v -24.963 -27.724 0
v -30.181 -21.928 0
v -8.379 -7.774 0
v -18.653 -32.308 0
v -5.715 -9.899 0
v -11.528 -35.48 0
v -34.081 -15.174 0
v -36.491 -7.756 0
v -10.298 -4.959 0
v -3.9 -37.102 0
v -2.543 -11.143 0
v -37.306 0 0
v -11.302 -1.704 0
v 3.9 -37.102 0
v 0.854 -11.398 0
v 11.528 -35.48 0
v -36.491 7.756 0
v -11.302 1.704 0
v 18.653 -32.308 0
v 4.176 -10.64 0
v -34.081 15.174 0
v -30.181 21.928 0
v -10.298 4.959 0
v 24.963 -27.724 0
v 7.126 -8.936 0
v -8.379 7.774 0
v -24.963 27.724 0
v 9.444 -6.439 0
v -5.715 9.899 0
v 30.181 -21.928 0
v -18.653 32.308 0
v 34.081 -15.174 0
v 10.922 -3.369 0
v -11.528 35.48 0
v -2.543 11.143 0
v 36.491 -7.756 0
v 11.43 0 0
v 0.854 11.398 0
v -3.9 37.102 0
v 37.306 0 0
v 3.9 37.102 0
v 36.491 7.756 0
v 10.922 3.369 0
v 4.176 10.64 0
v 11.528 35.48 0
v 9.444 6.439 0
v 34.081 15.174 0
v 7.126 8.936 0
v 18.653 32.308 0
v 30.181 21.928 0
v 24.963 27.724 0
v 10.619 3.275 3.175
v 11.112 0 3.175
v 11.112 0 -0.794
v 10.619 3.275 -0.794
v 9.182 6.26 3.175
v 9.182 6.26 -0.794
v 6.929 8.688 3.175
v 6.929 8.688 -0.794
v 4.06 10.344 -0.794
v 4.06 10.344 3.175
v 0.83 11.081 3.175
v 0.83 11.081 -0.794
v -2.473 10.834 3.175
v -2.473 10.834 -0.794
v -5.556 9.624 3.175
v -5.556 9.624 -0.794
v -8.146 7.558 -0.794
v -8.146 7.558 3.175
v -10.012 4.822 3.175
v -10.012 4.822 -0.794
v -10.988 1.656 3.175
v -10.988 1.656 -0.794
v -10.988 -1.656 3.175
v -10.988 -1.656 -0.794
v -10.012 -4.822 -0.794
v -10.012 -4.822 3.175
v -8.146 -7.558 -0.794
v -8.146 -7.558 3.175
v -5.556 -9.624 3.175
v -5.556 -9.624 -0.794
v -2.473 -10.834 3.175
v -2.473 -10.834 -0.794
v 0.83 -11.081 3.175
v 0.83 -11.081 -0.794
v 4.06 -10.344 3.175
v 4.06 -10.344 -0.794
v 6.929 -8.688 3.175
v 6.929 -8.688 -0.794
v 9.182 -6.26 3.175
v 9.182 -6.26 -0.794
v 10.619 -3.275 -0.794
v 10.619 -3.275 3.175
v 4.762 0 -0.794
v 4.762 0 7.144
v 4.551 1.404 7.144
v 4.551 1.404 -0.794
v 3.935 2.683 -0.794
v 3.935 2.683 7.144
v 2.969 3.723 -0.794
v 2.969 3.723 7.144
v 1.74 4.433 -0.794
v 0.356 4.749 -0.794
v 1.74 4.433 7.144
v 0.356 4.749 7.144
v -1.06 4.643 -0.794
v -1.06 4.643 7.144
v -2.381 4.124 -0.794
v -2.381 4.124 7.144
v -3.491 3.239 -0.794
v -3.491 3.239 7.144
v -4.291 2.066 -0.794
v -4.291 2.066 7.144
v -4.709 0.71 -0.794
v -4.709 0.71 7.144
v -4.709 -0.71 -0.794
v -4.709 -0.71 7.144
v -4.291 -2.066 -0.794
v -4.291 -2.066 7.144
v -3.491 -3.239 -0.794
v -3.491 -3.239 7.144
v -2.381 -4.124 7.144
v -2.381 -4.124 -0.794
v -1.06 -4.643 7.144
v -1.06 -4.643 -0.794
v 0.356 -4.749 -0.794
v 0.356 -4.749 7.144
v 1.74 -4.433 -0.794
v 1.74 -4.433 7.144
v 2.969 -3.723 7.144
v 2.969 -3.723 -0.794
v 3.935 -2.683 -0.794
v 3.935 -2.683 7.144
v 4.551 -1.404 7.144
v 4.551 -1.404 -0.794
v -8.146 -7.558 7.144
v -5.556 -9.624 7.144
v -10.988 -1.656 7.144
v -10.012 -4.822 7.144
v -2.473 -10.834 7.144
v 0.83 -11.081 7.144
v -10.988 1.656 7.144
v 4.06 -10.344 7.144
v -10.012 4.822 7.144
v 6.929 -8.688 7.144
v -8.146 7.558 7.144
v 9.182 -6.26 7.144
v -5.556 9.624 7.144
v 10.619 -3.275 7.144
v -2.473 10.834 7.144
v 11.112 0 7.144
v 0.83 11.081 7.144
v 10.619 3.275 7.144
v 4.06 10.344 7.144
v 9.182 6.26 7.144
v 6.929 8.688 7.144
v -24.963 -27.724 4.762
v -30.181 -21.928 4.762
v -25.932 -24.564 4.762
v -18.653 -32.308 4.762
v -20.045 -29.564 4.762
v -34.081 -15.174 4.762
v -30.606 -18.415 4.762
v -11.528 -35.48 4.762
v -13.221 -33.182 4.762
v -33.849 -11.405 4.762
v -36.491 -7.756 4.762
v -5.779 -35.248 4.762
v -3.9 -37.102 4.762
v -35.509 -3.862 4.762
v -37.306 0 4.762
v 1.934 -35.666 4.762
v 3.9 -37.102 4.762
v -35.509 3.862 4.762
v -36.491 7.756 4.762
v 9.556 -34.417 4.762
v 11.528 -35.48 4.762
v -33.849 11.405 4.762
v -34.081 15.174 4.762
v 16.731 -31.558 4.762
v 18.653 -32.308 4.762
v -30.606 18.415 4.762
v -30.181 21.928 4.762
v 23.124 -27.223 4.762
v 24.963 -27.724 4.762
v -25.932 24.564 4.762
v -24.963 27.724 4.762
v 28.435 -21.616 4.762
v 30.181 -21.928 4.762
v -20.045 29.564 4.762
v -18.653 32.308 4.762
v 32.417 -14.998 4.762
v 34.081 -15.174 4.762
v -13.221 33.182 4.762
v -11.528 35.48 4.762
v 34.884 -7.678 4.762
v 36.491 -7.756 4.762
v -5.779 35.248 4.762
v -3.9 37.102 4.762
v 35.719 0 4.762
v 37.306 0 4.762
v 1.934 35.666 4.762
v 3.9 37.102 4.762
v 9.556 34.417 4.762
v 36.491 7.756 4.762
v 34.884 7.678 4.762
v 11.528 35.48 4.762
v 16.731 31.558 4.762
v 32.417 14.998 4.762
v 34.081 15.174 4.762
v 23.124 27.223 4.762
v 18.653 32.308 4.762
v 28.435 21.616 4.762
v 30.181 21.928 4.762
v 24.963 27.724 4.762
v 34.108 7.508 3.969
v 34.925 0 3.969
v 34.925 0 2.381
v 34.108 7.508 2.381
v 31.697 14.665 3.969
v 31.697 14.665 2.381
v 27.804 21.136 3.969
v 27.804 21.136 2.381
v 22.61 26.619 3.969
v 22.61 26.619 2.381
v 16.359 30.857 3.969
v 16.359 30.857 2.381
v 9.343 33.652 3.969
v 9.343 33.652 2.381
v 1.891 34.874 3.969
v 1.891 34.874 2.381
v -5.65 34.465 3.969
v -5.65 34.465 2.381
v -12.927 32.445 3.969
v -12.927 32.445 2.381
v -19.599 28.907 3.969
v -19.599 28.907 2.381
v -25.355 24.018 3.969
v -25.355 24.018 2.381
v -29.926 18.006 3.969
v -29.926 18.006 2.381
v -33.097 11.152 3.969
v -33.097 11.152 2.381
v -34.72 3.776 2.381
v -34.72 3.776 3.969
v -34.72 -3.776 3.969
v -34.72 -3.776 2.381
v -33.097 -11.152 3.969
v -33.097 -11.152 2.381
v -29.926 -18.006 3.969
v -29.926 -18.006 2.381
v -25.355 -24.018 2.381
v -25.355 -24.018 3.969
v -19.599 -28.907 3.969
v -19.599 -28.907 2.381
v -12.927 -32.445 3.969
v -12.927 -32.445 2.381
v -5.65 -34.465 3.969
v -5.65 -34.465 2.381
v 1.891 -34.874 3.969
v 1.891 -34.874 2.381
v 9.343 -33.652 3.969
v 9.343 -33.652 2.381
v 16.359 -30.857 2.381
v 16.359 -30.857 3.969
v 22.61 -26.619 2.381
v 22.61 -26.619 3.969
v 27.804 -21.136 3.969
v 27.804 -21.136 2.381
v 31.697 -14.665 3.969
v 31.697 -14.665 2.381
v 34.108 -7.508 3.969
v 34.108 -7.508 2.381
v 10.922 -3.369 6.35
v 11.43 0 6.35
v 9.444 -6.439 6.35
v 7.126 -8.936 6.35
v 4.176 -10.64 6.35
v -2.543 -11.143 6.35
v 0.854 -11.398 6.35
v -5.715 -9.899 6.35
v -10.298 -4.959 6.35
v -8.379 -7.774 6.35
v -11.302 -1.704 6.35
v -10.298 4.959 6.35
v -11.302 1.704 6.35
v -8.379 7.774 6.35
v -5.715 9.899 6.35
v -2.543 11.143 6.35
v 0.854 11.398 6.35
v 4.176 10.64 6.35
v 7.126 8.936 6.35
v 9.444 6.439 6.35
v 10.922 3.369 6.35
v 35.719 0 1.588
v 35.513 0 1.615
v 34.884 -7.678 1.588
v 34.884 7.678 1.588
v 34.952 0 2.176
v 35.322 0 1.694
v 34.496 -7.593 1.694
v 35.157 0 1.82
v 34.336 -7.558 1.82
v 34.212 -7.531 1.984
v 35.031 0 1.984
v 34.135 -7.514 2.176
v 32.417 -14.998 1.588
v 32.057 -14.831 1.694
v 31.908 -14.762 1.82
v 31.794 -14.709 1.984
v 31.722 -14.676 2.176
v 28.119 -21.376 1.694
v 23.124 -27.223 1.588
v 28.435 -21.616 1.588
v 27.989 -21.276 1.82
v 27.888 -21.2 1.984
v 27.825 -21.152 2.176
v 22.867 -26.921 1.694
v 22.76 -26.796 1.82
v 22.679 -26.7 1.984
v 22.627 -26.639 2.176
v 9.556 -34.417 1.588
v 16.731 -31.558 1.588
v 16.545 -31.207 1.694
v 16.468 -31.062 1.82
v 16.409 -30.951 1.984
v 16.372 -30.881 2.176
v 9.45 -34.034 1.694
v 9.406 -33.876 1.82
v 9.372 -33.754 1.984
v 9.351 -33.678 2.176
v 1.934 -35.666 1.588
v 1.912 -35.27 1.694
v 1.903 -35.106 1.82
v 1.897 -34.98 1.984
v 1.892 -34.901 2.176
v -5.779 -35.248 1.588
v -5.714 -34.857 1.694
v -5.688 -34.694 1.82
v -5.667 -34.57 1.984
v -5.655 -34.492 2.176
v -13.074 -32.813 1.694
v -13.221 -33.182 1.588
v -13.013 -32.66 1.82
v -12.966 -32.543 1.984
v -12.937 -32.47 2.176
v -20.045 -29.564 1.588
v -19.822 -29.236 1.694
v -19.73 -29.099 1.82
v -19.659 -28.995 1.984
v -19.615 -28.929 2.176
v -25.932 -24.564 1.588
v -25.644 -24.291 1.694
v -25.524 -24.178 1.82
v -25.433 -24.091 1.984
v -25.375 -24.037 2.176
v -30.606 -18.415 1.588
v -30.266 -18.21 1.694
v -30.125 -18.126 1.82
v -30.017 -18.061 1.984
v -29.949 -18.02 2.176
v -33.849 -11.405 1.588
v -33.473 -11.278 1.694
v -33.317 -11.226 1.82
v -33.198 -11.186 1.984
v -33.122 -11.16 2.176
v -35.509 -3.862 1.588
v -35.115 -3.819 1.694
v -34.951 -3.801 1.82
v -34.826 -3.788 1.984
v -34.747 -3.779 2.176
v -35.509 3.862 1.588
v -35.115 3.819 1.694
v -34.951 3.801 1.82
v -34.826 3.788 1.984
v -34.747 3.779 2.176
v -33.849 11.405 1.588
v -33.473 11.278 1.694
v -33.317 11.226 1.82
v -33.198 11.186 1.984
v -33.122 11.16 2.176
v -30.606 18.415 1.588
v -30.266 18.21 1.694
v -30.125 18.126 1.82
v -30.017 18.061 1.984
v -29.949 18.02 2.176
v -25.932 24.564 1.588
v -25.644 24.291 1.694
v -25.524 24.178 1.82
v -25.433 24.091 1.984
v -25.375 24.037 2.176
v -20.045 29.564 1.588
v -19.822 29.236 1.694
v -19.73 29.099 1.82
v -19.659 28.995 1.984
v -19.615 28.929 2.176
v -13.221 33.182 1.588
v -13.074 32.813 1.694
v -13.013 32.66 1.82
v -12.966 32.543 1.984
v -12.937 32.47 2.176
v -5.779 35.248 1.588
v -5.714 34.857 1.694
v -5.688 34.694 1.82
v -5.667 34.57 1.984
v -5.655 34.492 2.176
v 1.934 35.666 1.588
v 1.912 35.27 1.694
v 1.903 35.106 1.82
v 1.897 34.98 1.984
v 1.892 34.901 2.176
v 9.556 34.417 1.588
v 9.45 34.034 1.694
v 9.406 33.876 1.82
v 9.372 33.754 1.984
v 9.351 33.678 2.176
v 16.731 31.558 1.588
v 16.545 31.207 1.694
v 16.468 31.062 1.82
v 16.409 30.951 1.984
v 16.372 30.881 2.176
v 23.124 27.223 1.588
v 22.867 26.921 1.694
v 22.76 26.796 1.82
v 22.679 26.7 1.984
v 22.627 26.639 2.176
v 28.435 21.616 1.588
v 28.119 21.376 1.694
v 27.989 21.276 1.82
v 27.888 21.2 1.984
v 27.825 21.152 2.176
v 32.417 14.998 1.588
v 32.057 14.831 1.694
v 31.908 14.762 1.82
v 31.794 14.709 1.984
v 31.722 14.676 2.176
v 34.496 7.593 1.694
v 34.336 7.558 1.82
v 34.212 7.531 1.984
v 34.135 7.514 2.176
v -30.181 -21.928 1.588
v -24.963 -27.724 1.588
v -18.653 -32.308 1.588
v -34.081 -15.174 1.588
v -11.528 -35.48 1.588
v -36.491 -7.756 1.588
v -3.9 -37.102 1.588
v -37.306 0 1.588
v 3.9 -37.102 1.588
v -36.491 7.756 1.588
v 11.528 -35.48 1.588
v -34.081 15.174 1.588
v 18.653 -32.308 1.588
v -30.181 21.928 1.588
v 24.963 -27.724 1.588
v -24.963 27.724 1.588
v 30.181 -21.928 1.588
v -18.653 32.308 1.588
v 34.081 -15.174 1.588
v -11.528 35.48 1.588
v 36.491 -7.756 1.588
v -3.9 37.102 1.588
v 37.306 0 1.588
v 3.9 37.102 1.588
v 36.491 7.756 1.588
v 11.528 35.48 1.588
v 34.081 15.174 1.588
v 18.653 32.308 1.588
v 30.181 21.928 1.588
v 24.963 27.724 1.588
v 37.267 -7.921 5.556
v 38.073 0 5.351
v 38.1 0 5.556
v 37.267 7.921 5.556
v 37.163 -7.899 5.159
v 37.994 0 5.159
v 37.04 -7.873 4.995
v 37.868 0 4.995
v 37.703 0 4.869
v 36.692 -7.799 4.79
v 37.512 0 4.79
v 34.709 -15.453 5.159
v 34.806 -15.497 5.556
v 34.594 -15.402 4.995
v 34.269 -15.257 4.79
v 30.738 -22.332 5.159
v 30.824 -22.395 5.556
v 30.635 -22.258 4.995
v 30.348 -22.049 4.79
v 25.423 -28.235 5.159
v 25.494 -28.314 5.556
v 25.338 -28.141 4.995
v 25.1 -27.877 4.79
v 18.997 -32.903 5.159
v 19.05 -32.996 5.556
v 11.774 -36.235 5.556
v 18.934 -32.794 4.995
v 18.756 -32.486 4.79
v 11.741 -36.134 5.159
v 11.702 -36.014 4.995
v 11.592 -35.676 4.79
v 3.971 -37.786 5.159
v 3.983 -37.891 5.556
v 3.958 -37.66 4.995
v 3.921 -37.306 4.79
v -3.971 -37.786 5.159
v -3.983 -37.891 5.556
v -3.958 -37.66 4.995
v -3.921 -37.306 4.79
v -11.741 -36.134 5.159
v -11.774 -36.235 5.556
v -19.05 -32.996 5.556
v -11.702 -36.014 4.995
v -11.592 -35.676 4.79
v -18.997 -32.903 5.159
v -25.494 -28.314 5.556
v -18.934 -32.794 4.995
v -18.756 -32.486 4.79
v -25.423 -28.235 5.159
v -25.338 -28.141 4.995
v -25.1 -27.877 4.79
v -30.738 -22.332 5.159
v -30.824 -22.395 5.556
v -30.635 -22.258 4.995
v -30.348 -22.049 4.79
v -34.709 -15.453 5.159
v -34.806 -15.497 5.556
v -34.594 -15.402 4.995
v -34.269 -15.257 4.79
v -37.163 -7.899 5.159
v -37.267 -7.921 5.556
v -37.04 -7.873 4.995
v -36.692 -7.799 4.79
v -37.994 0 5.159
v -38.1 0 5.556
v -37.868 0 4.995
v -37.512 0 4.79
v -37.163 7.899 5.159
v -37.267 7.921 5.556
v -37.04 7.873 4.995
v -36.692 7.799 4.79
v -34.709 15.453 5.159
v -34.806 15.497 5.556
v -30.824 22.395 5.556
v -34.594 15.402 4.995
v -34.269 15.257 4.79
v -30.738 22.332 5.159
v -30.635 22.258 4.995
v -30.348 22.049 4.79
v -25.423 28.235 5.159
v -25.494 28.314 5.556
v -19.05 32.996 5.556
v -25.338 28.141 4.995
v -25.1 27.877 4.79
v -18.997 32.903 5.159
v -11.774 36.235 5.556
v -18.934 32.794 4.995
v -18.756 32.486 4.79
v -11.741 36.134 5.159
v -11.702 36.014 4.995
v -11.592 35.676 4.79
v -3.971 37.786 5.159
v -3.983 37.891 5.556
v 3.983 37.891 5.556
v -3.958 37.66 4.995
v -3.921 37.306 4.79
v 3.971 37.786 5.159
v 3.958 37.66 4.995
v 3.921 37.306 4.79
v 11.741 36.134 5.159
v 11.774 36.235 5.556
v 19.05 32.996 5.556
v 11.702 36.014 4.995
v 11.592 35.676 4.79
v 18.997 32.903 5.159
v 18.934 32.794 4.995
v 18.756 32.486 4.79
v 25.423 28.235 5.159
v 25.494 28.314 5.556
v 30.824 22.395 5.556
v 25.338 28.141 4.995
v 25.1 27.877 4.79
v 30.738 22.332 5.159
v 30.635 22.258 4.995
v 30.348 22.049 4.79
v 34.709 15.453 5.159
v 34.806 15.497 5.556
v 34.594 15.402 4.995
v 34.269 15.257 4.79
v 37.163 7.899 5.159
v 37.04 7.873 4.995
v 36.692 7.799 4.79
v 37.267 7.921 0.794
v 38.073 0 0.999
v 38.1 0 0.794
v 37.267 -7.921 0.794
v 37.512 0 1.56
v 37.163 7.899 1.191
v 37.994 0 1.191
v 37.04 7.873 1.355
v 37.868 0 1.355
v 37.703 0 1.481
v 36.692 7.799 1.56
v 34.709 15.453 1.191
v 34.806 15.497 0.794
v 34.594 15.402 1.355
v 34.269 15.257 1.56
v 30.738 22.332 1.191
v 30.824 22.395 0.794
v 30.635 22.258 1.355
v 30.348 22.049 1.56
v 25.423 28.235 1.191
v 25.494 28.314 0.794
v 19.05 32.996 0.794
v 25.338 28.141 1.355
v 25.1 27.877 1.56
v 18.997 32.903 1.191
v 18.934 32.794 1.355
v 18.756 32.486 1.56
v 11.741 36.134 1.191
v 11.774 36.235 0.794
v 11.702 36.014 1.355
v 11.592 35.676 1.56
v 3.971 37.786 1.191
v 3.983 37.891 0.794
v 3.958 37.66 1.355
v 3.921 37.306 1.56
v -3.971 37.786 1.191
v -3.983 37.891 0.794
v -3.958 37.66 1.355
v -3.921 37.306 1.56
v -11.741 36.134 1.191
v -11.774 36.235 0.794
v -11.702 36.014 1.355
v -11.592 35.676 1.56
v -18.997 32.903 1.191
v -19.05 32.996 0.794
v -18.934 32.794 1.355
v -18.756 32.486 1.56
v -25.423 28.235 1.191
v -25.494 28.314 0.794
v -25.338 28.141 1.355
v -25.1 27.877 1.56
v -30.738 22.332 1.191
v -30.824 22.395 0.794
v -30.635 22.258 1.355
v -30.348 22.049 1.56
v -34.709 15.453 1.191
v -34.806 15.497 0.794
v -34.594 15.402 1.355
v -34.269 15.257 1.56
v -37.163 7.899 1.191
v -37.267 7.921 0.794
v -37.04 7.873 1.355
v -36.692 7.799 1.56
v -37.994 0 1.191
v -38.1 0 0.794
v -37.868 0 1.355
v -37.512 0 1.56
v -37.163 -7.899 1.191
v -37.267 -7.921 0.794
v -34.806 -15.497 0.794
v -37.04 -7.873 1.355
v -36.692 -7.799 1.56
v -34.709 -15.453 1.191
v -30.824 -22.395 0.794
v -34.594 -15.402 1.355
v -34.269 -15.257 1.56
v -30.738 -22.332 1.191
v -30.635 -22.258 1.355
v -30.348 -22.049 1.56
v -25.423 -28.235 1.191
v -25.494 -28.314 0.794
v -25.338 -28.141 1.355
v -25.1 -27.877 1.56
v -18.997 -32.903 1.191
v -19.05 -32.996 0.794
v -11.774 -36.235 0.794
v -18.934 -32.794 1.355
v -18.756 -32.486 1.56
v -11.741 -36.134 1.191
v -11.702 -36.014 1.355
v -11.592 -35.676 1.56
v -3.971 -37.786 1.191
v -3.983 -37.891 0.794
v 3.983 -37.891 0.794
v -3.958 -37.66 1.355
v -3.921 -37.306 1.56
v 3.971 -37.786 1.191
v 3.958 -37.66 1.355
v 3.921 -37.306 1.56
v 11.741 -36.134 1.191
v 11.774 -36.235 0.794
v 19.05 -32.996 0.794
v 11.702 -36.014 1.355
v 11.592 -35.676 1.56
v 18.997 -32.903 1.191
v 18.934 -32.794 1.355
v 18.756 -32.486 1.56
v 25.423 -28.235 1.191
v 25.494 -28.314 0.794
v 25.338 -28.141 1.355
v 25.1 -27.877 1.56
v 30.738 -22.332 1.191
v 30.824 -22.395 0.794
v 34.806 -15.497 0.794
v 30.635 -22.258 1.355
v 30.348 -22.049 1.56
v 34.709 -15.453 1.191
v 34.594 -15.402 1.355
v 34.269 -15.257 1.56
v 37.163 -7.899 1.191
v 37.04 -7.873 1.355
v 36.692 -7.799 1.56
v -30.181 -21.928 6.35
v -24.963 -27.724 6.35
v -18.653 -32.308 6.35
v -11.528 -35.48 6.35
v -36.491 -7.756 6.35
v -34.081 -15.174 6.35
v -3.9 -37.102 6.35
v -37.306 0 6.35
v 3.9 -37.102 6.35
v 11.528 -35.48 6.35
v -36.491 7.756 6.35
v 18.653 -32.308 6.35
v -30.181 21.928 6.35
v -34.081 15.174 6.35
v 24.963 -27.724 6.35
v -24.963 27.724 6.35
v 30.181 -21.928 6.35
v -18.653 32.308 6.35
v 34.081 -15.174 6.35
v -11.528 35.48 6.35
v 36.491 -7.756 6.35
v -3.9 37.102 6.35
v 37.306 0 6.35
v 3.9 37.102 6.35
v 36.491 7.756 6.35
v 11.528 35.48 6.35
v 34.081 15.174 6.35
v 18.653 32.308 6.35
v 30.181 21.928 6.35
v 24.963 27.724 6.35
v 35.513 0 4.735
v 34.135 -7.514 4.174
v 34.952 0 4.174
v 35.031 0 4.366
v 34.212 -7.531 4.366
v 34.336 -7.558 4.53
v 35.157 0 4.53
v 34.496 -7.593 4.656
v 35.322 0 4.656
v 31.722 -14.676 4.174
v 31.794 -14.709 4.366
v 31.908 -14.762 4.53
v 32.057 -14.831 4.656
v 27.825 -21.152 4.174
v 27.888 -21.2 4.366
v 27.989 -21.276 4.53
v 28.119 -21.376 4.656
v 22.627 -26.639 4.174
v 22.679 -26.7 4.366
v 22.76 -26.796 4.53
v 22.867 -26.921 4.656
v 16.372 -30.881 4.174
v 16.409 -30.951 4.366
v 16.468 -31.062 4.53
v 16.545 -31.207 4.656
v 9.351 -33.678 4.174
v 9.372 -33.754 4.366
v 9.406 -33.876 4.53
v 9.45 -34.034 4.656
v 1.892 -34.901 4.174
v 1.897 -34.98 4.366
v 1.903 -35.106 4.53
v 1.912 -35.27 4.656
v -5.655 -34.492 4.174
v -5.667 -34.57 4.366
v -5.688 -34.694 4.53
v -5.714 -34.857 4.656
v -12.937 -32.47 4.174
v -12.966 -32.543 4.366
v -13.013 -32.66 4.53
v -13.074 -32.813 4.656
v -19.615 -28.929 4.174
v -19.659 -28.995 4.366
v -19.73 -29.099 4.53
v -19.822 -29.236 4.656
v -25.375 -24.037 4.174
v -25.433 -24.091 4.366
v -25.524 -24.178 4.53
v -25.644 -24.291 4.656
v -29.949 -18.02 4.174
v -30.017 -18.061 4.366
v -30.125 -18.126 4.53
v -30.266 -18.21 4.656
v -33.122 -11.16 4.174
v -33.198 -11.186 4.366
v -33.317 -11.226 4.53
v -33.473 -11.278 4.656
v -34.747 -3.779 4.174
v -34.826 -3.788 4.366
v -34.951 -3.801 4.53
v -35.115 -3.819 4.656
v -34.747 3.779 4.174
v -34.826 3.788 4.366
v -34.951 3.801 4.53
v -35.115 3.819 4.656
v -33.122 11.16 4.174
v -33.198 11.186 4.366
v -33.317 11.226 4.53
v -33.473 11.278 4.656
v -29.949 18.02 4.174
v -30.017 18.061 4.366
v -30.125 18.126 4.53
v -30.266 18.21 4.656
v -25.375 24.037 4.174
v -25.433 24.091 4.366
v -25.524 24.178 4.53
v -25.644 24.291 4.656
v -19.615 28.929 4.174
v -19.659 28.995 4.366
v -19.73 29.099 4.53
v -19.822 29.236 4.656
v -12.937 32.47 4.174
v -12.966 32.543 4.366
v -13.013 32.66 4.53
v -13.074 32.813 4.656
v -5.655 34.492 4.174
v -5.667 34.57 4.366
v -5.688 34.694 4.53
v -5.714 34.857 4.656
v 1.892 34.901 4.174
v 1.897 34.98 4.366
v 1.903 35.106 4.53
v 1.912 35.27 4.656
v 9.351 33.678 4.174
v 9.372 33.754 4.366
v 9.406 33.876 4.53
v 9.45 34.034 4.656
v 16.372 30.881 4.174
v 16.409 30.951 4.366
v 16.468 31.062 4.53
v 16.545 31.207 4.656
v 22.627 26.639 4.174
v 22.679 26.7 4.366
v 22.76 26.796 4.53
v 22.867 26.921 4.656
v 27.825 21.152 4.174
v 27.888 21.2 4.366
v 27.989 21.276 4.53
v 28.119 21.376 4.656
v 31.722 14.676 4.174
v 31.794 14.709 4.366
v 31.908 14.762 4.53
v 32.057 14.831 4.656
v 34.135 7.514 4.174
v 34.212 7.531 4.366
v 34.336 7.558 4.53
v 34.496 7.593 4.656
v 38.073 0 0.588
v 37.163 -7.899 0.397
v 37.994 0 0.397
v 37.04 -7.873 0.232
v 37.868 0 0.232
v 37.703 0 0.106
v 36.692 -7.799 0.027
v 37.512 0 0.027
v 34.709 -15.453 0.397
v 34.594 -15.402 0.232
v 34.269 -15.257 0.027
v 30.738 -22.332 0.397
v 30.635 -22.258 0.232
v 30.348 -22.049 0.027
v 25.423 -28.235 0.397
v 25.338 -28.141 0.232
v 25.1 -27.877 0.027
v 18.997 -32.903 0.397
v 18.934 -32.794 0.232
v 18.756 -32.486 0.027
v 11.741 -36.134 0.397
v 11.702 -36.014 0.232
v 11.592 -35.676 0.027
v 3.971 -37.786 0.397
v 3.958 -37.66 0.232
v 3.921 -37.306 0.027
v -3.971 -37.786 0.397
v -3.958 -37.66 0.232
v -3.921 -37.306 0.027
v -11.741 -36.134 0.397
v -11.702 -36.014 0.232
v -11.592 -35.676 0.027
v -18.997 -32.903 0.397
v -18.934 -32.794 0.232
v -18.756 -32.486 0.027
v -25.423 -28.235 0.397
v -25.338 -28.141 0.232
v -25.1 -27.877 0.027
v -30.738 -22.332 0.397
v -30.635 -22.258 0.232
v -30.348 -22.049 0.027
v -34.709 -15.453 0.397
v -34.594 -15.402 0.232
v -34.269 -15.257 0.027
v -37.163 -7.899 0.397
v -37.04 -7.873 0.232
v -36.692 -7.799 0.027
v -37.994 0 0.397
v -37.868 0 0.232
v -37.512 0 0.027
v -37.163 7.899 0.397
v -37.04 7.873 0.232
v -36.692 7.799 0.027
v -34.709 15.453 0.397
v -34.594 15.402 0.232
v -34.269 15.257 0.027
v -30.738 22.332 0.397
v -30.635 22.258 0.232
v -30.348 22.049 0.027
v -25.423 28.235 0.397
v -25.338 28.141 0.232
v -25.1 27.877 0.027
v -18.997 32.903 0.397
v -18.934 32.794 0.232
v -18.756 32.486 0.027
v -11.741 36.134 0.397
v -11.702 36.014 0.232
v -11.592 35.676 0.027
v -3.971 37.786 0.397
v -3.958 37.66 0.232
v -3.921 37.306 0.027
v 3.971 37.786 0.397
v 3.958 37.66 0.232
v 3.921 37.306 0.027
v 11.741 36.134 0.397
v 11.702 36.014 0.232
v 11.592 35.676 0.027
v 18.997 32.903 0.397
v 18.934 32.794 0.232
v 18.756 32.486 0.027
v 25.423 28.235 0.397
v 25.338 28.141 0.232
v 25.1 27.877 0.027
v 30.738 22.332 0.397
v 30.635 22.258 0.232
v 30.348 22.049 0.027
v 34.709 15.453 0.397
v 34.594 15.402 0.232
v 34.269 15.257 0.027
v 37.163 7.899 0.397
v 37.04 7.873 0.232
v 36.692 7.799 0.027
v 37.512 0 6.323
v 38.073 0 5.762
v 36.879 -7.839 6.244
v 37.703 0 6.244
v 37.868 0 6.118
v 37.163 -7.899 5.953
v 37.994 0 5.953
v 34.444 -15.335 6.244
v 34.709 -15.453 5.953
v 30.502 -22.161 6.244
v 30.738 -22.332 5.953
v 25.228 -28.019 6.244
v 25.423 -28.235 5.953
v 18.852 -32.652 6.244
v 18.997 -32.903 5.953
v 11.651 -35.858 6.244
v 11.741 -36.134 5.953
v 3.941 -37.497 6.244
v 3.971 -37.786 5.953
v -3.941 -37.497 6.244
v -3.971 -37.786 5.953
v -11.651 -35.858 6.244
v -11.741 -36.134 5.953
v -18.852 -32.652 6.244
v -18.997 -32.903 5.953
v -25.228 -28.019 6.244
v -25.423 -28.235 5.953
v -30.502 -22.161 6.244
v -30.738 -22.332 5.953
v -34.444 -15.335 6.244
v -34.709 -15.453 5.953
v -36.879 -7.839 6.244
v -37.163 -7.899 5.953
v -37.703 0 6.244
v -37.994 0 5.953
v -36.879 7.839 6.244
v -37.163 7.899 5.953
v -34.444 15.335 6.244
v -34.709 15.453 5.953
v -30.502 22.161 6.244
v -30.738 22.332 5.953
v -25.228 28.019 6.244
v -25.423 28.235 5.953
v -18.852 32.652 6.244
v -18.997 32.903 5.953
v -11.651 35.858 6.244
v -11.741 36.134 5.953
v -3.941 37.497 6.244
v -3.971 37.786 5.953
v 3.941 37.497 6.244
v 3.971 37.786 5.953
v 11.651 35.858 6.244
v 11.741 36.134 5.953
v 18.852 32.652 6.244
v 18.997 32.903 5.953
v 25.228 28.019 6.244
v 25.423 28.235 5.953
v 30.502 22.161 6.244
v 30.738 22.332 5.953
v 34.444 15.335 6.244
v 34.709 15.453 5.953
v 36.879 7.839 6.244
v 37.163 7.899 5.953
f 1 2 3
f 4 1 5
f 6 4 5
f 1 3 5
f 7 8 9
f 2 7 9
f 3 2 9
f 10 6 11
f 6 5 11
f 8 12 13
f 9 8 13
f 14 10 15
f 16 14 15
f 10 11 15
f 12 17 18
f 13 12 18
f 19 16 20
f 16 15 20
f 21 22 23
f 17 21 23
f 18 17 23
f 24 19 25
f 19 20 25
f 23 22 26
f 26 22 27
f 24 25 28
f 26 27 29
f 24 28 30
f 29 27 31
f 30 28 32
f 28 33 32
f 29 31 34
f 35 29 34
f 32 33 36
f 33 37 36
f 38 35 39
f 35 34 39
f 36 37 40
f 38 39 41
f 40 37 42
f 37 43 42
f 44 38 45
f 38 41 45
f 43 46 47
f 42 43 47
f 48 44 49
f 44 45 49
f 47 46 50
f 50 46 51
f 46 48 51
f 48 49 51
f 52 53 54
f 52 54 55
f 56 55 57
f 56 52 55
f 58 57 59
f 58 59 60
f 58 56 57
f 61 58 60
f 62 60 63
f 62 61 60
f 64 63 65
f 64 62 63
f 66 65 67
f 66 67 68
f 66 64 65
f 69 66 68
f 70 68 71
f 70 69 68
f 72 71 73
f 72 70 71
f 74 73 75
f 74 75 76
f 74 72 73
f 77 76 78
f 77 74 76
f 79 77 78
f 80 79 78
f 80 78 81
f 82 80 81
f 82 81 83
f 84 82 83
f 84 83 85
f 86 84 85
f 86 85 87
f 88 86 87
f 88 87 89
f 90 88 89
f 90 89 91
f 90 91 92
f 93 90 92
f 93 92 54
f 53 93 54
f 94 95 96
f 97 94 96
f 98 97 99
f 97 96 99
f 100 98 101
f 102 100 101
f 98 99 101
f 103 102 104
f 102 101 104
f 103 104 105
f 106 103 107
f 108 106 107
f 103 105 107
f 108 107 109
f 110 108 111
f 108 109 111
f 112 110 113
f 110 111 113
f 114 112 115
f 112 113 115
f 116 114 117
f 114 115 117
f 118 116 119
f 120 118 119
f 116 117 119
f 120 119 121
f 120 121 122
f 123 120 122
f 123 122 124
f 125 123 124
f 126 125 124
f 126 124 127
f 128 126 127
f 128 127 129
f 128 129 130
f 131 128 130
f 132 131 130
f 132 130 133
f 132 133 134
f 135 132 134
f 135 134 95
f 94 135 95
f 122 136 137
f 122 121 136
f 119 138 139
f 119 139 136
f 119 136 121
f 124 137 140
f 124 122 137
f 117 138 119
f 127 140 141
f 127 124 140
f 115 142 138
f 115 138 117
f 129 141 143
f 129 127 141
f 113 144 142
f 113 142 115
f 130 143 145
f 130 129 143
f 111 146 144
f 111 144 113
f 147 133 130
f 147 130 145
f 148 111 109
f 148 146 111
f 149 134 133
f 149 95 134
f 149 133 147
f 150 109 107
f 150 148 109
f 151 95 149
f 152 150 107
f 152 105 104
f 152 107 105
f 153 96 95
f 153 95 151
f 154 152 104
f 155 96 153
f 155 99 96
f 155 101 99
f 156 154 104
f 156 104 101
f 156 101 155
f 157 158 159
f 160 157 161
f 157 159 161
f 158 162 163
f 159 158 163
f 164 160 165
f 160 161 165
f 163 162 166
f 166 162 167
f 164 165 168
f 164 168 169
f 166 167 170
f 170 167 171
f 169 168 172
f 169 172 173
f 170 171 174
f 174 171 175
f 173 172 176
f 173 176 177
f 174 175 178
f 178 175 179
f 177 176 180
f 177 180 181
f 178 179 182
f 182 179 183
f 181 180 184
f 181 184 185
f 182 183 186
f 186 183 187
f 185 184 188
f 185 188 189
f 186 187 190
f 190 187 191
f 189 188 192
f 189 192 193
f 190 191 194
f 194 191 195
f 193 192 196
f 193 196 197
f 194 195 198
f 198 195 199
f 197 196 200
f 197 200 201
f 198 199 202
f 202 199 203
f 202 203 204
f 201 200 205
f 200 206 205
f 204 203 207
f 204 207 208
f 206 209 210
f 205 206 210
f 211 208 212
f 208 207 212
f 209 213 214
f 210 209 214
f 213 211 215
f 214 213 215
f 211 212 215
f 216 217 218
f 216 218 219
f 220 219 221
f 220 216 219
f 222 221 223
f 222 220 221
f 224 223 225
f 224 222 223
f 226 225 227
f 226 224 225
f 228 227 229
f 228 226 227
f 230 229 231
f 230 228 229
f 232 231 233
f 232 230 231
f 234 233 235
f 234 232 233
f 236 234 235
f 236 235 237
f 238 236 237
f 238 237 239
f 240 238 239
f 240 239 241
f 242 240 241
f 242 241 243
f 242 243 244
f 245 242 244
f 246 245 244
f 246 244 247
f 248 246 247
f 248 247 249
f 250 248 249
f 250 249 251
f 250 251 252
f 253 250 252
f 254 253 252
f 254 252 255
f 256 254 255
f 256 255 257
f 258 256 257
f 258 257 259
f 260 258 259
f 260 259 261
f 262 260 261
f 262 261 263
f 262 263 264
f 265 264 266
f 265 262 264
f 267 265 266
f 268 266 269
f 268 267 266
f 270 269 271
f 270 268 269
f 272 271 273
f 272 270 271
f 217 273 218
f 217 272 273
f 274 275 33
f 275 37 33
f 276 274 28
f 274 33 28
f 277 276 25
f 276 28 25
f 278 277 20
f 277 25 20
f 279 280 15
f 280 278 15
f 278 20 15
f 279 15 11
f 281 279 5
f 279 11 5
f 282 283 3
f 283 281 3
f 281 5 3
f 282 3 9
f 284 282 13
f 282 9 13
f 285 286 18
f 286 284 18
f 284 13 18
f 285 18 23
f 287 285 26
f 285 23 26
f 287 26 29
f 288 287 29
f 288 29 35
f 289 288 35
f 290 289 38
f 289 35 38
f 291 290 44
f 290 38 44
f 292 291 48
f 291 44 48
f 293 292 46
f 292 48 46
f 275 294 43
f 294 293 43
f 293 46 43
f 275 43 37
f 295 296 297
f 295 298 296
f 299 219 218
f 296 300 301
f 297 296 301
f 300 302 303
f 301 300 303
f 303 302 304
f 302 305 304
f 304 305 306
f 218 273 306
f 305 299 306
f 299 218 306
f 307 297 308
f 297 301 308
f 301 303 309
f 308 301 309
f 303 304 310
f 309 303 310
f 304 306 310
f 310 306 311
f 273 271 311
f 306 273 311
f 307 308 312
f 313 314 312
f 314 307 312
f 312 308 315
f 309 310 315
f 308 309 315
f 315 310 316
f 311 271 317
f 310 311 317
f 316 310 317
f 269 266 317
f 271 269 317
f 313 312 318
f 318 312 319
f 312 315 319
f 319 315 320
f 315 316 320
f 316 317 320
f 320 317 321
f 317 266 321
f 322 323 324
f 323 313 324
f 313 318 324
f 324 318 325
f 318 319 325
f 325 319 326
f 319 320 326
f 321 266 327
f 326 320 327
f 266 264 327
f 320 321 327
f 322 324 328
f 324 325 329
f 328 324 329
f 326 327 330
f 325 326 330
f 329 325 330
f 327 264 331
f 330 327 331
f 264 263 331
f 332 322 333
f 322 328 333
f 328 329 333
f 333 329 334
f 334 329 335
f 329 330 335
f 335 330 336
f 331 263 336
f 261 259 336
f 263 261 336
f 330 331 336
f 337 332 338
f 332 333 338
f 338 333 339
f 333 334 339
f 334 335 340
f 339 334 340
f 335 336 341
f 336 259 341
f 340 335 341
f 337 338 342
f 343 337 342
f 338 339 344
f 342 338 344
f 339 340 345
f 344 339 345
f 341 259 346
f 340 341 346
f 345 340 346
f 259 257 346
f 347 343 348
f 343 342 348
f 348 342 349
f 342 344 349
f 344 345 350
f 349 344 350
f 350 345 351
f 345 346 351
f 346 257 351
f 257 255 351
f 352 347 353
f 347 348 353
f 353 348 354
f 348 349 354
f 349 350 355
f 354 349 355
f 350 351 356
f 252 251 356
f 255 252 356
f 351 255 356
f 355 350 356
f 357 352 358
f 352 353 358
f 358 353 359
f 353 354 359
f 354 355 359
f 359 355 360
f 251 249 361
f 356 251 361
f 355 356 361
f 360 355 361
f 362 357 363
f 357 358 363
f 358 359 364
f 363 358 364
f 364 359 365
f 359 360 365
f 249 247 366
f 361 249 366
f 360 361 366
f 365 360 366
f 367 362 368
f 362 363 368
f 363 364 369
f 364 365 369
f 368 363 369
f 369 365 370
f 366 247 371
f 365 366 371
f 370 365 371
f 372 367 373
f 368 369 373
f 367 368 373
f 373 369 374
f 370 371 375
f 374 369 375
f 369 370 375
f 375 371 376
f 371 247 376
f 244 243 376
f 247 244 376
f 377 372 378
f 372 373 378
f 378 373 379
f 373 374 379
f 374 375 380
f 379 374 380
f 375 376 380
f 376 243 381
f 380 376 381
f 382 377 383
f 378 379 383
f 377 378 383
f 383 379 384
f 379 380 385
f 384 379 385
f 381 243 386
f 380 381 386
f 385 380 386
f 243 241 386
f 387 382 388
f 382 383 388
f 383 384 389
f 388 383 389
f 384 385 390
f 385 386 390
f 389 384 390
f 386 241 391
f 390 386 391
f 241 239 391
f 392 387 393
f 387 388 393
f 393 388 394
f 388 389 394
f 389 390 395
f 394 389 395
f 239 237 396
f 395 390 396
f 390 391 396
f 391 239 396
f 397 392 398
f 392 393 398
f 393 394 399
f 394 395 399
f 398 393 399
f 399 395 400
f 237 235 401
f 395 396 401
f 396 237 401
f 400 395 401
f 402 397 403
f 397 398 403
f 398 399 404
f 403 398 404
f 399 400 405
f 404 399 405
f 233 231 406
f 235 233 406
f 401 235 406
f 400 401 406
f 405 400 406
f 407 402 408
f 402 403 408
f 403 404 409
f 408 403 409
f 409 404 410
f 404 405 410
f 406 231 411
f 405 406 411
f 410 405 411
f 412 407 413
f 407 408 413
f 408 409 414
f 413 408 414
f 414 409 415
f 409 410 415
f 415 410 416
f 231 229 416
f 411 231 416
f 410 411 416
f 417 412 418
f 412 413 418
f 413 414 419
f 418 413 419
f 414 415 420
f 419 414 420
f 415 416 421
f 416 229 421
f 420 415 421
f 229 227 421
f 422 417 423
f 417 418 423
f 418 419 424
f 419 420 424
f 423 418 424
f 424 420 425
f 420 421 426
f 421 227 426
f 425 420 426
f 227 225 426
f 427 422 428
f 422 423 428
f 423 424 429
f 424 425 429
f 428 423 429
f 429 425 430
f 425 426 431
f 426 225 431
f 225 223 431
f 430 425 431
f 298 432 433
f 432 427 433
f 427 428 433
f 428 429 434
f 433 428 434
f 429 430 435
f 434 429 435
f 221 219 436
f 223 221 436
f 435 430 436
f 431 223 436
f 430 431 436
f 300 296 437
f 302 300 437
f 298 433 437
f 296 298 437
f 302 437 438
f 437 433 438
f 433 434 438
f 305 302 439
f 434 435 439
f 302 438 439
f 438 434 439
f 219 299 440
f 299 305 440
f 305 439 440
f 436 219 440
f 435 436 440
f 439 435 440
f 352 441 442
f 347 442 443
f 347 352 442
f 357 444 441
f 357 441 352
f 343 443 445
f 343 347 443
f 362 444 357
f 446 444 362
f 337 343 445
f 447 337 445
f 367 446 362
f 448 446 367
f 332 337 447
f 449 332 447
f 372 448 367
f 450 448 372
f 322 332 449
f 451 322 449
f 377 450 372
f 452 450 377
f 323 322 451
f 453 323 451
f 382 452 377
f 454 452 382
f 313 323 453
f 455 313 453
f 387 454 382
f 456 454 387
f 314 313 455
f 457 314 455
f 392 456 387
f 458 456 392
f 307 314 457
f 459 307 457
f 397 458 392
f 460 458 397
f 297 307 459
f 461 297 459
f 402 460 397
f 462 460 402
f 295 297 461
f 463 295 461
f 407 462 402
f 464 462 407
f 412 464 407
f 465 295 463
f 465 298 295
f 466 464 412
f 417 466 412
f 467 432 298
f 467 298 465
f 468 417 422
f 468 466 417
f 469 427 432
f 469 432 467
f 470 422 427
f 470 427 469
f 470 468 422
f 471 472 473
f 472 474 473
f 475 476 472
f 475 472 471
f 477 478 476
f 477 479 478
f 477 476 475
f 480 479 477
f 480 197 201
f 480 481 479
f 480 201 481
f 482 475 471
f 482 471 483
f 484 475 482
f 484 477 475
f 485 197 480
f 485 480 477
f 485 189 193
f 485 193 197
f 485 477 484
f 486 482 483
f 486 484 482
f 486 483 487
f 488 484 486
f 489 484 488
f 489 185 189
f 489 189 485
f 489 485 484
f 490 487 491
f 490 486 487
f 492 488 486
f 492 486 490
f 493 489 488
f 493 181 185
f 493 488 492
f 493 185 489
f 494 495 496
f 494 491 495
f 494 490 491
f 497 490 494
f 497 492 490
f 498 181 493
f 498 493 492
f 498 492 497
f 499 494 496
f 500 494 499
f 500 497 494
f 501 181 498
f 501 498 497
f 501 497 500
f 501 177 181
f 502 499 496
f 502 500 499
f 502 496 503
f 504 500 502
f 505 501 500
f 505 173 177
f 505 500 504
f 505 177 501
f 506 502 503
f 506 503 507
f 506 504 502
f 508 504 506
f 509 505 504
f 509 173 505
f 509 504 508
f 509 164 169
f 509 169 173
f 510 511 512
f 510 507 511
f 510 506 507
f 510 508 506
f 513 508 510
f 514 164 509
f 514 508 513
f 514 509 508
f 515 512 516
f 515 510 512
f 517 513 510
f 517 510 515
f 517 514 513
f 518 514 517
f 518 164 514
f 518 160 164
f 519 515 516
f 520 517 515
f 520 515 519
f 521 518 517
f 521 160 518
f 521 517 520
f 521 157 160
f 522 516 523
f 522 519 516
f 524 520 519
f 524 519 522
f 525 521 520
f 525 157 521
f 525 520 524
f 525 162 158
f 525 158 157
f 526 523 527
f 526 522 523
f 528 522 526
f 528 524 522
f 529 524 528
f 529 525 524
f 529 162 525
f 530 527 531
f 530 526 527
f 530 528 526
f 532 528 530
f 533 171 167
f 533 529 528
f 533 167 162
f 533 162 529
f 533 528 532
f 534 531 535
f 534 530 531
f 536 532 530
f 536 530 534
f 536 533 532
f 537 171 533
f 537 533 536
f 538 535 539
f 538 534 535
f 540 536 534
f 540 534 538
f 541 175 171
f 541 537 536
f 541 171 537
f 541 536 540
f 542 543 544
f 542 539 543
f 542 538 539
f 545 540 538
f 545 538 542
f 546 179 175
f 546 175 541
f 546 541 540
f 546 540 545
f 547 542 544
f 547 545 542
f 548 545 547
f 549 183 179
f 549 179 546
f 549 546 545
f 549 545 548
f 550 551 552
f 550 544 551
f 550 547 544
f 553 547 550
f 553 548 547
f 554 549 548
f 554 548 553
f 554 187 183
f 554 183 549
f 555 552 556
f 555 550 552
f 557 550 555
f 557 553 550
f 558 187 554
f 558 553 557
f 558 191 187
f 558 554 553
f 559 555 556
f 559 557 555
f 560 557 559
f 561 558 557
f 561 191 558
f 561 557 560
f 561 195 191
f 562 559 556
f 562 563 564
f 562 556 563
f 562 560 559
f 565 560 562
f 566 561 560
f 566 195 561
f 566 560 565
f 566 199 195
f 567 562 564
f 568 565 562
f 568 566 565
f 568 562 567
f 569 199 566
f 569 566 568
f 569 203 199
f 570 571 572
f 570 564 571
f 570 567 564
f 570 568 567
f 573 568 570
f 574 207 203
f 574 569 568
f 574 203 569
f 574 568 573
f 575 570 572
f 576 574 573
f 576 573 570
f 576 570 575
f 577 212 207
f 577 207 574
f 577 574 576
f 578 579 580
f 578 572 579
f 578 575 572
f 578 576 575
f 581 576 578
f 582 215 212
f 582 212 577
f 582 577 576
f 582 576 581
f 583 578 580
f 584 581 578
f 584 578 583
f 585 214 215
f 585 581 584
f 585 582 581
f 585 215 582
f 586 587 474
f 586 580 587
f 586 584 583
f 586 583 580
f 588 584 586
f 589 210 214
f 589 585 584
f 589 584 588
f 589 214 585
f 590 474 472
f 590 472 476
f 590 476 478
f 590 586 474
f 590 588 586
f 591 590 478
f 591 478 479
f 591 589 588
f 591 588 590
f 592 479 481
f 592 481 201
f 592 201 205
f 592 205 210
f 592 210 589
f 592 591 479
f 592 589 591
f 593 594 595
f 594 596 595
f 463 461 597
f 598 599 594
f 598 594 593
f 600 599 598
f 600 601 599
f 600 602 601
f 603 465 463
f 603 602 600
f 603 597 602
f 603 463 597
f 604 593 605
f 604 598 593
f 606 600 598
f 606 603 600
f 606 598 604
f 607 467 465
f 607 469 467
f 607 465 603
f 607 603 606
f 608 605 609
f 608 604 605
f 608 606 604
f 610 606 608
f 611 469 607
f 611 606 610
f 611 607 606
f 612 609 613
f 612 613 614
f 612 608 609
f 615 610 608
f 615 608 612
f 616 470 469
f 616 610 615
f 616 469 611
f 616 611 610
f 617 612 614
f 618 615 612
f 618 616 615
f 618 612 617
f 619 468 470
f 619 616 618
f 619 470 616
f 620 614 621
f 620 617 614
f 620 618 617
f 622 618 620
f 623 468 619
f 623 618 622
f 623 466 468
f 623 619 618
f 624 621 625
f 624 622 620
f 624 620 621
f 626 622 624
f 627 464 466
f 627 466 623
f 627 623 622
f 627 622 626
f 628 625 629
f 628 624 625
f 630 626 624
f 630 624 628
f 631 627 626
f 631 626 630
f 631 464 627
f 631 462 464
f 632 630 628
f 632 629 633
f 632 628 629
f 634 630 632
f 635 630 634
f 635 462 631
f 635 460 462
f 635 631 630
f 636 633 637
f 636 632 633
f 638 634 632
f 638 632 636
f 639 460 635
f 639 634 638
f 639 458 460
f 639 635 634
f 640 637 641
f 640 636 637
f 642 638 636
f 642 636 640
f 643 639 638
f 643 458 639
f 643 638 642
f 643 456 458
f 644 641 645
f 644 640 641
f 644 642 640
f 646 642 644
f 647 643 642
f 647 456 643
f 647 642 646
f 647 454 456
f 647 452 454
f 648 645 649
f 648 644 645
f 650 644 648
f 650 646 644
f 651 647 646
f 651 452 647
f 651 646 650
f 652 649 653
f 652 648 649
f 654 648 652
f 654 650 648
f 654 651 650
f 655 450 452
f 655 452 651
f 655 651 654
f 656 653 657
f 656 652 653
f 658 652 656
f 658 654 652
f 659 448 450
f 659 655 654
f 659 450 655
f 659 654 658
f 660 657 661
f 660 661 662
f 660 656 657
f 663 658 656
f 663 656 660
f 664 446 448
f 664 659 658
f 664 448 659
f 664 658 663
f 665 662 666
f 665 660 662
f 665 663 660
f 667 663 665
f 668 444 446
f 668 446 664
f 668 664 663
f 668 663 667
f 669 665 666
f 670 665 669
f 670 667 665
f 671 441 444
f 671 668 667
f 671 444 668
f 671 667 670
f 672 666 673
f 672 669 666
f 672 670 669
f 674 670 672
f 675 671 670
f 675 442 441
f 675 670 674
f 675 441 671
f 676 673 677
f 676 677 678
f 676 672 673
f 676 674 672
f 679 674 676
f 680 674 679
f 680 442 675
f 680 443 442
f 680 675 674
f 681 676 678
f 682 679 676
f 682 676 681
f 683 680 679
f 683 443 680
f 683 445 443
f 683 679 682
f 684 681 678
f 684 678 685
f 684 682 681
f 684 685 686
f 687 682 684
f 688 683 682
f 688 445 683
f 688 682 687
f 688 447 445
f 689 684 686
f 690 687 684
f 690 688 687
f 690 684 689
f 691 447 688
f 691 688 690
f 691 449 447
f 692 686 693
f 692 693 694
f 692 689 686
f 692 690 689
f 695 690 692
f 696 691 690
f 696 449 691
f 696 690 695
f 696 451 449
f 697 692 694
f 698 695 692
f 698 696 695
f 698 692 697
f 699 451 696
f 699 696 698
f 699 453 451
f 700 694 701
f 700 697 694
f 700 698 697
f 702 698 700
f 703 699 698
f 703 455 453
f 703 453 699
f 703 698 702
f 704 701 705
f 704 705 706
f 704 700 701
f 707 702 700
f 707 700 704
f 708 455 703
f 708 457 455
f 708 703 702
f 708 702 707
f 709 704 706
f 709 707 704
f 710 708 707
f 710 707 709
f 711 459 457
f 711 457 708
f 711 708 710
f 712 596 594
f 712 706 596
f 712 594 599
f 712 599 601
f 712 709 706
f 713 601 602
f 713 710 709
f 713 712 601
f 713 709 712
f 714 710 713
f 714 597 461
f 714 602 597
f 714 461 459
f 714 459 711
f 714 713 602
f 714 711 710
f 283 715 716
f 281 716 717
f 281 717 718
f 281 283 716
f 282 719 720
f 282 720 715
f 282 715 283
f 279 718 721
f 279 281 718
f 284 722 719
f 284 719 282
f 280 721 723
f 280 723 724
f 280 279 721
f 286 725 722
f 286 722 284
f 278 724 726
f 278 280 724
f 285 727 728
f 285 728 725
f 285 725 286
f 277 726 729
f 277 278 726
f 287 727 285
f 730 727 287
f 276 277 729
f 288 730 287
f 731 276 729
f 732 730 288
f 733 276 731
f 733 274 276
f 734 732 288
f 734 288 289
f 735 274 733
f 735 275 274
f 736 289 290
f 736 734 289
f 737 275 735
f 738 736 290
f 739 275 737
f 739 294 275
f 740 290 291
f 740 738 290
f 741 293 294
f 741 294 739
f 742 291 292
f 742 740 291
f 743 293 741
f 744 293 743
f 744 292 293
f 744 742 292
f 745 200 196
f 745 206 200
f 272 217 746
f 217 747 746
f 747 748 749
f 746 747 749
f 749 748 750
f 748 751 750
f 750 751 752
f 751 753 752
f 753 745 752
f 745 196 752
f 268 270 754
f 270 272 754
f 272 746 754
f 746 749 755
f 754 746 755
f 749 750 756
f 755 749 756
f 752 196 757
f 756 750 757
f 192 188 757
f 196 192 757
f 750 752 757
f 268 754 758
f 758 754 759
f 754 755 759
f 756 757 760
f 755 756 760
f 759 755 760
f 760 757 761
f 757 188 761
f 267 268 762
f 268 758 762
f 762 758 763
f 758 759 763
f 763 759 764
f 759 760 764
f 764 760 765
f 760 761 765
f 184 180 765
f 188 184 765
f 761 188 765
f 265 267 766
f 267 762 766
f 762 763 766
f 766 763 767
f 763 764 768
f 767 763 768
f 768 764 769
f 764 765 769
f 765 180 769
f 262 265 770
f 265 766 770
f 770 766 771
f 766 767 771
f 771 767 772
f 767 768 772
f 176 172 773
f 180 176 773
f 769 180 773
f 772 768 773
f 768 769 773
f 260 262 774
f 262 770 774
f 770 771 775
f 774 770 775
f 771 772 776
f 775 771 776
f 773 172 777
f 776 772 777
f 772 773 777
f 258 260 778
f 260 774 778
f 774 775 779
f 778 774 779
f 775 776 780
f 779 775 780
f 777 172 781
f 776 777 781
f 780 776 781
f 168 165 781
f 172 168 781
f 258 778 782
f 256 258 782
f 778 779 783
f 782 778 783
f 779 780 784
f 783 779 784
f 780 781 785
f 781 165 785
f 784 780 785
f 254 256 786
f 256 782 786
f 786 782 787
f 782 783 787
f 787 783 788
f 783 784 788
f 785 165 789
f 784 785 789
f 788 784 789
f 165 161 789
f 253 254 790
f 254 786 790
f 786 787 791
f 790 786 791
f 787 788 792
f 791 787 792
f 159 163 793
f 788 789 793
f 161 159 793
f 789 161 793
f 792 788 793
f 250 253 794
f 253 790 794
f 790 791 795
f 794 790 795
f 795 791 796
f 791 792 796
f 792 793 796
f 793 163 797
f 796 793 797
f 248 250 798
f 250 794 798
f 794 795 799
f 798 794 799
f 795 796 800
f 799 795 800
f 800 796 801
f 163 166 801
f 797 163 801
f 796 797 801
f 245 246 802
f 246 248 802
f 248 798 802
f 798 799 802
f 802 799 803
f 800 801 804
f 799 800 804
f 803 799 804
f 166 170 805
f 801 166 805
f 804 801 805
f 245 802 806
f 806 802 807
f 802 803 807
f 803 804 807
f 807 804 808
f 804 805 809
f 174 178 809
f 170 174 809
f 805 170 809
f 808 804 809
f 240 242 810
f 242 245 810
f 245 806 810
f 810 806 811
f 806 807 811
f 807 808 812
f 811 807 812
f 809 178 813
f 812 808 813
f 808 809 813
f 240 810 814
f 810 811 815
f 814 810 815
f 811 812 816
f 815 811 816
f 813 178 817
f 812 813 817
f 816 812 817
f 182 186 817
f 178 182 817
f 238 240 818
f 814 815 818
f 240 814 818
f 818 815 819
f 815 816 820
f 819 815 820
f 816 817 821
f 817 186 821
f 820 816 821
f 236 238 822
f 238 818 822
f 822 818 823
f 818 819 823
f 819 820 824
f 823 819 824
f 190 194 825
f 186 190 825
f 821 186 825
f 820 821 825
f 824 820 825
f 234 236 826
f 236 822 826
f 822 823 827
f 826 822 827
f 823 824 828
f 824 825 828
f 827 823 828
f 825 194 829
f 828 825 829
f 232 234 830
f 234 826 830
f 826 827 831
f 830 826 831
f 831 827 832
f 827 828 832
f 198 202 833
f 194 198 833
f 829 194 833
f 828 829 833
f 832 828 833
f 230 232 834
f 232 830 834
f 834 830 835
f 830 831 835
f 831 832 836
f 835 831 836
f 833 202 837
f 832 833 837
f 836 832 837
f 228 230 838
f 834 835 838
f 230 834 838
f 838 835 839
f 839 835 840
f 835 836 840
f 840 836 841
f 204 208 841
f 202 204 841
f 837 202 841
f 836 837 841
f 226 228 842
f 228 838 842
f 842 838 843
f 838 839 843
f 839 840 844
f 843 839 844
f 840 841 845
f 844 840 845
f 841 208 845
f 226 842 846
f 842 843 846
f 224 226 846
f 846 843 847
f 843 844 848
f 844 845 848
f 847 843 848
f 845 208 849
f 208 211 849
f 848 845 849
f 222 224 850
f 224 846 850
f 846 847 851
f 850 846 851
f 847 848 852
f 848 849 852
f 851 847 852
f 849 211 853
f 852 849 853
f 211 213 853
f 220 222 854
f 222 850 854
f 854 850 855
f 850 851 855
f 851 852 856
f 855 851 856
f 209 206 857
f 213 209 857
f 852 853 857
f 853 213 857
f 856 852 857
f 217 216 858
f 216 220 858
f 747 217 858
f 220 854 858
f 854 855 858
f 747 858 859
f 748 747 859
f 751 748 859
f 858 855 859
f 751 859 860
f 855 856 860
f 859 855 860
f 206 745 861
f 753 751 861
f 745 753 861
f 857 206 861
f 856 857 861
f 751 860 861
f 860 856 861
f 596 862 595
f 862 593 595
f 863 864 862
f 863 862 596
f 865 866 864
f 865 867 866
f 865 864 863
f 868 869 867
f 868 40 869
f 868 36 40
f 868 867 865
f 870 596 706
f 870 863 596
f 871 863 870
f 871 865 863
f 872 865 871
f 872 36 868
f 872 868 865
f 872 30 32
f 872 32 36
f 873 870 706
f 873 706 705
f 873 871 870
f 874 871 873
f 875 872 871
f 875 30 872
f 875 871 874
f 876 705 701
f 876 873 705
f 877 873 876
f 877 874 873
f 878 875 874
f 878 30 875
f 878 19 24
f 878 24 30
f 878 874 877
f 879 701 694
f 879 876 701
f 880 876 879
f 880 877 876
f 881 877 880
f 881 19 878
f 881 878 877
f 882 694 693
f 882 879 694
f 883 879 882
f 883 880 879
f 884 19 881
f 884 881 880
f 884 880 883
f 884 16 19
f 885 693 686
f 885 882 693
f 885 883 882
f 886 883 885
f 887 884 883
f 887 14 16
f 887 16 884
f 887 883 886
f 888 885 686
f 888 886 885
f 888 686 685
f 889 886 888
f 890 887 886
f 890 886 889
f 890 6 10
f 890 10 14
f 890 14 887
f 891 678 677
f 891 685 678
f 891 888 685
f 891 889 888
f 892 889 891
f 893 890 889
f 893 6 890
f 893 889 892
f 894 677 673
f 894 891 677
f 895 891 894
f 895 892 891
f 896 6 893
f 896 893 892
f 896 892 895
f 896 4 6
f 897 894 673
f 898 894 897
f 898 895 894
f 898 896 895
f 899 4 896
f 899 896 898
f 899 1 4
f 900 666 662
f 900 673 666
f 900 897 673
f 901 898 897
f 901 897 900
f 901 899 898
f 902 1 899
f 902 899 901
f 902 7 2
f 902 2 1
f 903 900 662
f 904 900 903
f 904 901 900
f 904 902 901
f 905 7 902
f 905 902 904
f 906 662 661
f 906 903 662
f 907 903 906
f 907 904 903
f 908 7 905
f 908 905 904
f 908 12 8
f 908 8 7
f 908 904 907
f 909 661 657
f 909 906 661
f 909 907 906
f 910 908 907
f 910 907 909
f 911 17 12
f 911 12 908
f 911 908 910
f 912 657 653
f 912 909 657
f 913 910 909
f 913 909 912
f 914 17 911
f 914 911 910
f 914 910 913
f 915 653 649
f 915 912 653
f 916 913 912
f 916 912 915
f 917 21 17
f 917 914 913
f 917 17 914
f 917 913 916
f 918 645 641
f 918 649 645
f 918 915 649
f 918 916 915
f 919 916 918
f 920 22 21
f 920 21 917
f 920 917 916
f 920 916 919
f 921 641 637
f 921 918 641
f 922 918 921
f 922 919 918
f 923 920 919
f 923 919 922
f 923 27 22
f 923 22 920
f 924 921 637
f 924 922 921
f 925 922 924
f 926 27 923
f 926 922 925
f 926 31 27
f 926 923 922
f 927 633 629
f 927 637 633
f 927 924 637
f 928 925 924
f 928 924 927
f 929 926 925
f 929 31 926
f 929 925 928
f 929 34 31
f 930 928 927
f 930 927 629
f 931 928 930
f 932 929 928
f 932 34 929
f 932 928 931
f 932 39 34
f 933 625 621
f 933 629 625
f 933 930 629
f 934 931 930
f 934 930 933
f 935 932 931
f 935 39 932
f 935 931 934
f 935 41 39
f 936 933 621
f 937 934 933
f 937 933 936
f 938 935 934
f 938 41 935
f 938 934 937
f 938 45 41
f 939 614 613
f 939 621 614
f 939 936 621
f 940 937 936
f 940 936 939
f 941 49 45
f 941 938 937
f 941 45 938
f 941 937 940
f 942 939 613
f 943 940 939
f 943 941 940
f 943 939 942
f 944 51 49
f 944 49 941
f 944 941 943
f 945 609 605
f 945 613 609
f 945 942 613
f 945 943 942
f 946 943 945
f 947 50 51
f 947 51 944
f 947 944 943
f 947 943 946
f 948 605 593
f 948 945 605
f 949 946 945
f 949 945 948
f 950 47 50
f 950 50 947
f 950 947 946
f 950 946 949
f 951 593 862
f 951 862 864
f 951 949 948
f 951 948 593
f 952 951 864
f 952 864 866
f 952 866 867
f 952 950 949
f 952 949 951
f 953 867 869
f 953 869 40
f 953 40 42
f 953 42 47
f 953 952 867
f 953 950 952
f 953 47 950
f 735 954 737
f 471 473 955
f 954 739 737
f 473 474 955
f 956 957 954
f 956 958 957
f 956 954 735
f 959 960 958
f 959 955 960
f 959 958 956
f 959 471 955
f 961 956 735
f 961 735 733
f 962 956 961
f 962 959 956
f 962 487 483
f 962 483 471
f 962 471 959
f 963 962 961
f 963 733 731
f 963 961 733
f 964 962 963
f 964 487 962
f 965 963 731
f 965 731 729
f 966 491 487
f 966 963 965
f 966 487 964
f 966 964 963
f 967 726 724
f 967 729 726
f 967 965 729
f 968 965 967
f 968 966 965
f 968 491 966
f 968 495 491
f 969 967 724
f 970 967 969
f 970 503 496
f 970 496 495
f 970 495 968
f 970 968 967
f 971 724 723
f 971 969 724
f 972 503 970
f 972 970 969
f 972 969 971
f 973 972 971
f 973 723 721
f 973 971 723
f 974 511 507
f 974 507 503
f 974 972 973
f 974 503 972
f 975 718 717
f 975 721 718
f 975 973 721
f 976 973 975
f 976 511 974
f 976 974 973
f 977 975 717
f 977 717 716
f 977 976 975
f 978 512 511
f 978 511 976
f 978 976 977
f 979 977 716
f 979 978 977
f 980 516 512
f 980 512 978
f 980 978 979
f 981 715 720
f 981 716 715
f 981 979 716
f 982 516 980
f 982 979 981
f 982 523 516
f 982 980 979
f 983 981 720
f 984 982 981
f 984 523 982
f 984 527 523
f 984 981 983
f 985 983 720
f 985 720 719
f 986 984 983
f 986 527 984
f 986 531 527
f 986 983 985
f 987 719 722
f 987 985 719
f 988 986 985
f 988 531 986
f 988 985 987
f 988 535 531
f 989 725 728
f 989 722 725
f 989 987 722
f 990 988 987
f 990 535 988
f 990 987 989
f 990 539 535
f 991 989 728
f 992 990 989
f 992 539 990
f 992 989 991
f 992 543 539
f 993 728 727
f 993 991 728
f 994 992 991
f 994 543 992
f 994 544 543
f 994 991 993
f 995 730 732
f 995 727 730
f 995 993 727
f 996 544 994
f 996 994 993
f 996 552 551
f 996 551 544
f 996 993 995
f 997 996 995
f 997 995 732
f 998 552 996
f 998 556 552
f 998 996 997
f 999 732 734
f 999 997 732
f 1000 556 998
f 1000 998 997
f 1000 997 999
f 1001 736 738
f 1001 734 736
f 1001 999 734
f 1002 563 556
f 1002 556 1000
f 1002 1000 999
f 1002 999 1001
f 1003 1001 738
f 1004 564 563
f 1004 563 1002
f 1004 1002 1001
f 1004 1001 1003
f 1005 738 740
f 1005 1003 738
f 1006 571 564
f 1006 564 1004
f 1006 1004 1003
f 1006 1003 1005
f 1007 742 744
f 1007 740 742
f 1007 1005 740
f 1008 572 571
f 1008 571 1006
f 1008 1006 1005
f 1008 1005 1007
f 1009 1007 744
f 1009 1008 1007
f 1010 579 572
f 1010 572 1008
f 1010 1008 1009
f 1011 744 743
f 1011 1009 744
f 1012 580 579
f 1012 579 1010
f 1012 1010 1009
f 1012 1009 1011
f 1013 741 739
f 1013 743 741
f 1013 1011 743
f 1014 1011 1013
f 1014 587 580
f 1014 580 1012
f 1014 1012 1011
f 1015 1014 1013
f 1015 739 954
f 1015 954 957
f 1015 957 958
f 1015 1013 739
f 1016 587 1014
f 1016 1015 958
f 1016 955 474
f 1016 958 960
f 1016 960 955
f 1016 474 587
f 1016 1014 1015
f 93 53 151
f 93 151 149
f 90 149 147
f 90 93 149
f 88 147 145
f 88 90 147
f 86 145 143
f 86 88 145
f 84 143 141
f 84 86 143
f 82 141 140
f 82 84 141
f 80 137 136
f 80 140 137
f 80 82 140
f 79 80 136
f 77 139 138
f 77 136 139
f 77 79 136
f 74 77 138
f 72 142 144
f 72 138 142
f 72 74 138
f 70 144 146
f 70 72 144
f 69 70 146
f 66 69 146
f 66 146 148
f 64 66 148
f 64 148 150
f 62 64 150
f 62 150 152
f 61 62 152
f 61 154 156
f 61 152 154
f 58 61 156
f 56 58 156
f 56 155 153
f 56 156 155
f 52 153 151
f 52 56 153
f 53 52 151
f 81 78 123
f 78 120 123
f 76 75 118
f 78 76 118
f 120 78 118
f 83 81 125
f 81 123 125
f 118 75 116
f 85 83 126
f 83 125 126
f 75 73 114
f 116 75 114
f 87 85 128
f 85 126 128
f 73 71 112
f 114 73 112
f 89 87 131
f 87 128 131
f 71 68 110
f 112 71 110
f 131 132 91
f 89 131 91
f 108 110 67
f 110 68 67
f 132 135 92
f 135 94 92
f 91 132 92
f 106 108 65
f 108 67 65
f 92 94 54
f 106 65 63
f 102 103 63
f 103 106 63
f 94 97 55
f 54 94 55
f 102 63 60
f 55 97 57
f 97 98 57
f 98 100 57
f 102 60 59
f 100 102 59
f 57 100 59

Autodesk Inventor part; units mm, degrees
ref_plane "YZ Plane" through (0, 0, 0) normal (1, 0, 0) x (0, 1, 0)
ref_plane "XZ Plane" through (0, 0, 0) normal (0, 1, 0) x (-1, 0, 0)
sketch "Sketch1" plane through (0, 0, 0) normal (0, 0, 1) x (1, 0, 0)
  circle A0 centre (0, 0) radius 11.43
  circle A1 centre (0, 0) radius 38.1
  dimension "d0" = 22.86
  dimension "d1" = 76.2
extrude "Extrusion1" add sketch "Sketch1" along normal blind 6.35
ref_plane "Work Plane1" through (0, 0, 3.175) normal (0, 0, 1) x (1, 0, 0)
sketch "Sketch3" plane through (0, 0, 3.175) normal (0, 0, 1) x (1, 0, 0)
  circle A0 centre (0, 0) radius 11.1125
  dimension "d9" = 22.225
extrude "Extrusion3" add sketch "Sketch3" along normal mid plane 7.9375
sketch "Sketch4" plane through (0, 0, 7.1437) normal (0, 0, 1) x (1, 0, 0)
  circle A0 centre (0, 0) radius 4.7625
  dimension "d12" = 9.525
extrude "Extrusion4" cut sketch "Sketch4" against normal blind 25.4
sketch "Sketch5" plane through (0, 0, 3.175) normal (0, 0, 1) x (1, 0, 0)
  circle A0 centre (0, 0) radius 38.1
  circle A1 centre (0, 0) radius 34.925
  circle A2 centre (0, 0) radius 11.43 projected
  circle A3 centre (0, 0) radius 38.1 projected
  dimension "d15" = 3.175
  dimension "d16" = 0
extrude "Extrusion5" cut sketch "Sketch5" along normal mid plane 3.175 contours A0
fillet "Fillet2" radius 0.7937 6 edges at (-38.1, 0, 0) (-38.1, 0, 1.5875) (-34.925, 0, 1.5875) (-38.1, 0, 6.35) (-38.1, 0, 4.7625) (-34.925, 0, 4.7625)
properties part number "2in pulley"
